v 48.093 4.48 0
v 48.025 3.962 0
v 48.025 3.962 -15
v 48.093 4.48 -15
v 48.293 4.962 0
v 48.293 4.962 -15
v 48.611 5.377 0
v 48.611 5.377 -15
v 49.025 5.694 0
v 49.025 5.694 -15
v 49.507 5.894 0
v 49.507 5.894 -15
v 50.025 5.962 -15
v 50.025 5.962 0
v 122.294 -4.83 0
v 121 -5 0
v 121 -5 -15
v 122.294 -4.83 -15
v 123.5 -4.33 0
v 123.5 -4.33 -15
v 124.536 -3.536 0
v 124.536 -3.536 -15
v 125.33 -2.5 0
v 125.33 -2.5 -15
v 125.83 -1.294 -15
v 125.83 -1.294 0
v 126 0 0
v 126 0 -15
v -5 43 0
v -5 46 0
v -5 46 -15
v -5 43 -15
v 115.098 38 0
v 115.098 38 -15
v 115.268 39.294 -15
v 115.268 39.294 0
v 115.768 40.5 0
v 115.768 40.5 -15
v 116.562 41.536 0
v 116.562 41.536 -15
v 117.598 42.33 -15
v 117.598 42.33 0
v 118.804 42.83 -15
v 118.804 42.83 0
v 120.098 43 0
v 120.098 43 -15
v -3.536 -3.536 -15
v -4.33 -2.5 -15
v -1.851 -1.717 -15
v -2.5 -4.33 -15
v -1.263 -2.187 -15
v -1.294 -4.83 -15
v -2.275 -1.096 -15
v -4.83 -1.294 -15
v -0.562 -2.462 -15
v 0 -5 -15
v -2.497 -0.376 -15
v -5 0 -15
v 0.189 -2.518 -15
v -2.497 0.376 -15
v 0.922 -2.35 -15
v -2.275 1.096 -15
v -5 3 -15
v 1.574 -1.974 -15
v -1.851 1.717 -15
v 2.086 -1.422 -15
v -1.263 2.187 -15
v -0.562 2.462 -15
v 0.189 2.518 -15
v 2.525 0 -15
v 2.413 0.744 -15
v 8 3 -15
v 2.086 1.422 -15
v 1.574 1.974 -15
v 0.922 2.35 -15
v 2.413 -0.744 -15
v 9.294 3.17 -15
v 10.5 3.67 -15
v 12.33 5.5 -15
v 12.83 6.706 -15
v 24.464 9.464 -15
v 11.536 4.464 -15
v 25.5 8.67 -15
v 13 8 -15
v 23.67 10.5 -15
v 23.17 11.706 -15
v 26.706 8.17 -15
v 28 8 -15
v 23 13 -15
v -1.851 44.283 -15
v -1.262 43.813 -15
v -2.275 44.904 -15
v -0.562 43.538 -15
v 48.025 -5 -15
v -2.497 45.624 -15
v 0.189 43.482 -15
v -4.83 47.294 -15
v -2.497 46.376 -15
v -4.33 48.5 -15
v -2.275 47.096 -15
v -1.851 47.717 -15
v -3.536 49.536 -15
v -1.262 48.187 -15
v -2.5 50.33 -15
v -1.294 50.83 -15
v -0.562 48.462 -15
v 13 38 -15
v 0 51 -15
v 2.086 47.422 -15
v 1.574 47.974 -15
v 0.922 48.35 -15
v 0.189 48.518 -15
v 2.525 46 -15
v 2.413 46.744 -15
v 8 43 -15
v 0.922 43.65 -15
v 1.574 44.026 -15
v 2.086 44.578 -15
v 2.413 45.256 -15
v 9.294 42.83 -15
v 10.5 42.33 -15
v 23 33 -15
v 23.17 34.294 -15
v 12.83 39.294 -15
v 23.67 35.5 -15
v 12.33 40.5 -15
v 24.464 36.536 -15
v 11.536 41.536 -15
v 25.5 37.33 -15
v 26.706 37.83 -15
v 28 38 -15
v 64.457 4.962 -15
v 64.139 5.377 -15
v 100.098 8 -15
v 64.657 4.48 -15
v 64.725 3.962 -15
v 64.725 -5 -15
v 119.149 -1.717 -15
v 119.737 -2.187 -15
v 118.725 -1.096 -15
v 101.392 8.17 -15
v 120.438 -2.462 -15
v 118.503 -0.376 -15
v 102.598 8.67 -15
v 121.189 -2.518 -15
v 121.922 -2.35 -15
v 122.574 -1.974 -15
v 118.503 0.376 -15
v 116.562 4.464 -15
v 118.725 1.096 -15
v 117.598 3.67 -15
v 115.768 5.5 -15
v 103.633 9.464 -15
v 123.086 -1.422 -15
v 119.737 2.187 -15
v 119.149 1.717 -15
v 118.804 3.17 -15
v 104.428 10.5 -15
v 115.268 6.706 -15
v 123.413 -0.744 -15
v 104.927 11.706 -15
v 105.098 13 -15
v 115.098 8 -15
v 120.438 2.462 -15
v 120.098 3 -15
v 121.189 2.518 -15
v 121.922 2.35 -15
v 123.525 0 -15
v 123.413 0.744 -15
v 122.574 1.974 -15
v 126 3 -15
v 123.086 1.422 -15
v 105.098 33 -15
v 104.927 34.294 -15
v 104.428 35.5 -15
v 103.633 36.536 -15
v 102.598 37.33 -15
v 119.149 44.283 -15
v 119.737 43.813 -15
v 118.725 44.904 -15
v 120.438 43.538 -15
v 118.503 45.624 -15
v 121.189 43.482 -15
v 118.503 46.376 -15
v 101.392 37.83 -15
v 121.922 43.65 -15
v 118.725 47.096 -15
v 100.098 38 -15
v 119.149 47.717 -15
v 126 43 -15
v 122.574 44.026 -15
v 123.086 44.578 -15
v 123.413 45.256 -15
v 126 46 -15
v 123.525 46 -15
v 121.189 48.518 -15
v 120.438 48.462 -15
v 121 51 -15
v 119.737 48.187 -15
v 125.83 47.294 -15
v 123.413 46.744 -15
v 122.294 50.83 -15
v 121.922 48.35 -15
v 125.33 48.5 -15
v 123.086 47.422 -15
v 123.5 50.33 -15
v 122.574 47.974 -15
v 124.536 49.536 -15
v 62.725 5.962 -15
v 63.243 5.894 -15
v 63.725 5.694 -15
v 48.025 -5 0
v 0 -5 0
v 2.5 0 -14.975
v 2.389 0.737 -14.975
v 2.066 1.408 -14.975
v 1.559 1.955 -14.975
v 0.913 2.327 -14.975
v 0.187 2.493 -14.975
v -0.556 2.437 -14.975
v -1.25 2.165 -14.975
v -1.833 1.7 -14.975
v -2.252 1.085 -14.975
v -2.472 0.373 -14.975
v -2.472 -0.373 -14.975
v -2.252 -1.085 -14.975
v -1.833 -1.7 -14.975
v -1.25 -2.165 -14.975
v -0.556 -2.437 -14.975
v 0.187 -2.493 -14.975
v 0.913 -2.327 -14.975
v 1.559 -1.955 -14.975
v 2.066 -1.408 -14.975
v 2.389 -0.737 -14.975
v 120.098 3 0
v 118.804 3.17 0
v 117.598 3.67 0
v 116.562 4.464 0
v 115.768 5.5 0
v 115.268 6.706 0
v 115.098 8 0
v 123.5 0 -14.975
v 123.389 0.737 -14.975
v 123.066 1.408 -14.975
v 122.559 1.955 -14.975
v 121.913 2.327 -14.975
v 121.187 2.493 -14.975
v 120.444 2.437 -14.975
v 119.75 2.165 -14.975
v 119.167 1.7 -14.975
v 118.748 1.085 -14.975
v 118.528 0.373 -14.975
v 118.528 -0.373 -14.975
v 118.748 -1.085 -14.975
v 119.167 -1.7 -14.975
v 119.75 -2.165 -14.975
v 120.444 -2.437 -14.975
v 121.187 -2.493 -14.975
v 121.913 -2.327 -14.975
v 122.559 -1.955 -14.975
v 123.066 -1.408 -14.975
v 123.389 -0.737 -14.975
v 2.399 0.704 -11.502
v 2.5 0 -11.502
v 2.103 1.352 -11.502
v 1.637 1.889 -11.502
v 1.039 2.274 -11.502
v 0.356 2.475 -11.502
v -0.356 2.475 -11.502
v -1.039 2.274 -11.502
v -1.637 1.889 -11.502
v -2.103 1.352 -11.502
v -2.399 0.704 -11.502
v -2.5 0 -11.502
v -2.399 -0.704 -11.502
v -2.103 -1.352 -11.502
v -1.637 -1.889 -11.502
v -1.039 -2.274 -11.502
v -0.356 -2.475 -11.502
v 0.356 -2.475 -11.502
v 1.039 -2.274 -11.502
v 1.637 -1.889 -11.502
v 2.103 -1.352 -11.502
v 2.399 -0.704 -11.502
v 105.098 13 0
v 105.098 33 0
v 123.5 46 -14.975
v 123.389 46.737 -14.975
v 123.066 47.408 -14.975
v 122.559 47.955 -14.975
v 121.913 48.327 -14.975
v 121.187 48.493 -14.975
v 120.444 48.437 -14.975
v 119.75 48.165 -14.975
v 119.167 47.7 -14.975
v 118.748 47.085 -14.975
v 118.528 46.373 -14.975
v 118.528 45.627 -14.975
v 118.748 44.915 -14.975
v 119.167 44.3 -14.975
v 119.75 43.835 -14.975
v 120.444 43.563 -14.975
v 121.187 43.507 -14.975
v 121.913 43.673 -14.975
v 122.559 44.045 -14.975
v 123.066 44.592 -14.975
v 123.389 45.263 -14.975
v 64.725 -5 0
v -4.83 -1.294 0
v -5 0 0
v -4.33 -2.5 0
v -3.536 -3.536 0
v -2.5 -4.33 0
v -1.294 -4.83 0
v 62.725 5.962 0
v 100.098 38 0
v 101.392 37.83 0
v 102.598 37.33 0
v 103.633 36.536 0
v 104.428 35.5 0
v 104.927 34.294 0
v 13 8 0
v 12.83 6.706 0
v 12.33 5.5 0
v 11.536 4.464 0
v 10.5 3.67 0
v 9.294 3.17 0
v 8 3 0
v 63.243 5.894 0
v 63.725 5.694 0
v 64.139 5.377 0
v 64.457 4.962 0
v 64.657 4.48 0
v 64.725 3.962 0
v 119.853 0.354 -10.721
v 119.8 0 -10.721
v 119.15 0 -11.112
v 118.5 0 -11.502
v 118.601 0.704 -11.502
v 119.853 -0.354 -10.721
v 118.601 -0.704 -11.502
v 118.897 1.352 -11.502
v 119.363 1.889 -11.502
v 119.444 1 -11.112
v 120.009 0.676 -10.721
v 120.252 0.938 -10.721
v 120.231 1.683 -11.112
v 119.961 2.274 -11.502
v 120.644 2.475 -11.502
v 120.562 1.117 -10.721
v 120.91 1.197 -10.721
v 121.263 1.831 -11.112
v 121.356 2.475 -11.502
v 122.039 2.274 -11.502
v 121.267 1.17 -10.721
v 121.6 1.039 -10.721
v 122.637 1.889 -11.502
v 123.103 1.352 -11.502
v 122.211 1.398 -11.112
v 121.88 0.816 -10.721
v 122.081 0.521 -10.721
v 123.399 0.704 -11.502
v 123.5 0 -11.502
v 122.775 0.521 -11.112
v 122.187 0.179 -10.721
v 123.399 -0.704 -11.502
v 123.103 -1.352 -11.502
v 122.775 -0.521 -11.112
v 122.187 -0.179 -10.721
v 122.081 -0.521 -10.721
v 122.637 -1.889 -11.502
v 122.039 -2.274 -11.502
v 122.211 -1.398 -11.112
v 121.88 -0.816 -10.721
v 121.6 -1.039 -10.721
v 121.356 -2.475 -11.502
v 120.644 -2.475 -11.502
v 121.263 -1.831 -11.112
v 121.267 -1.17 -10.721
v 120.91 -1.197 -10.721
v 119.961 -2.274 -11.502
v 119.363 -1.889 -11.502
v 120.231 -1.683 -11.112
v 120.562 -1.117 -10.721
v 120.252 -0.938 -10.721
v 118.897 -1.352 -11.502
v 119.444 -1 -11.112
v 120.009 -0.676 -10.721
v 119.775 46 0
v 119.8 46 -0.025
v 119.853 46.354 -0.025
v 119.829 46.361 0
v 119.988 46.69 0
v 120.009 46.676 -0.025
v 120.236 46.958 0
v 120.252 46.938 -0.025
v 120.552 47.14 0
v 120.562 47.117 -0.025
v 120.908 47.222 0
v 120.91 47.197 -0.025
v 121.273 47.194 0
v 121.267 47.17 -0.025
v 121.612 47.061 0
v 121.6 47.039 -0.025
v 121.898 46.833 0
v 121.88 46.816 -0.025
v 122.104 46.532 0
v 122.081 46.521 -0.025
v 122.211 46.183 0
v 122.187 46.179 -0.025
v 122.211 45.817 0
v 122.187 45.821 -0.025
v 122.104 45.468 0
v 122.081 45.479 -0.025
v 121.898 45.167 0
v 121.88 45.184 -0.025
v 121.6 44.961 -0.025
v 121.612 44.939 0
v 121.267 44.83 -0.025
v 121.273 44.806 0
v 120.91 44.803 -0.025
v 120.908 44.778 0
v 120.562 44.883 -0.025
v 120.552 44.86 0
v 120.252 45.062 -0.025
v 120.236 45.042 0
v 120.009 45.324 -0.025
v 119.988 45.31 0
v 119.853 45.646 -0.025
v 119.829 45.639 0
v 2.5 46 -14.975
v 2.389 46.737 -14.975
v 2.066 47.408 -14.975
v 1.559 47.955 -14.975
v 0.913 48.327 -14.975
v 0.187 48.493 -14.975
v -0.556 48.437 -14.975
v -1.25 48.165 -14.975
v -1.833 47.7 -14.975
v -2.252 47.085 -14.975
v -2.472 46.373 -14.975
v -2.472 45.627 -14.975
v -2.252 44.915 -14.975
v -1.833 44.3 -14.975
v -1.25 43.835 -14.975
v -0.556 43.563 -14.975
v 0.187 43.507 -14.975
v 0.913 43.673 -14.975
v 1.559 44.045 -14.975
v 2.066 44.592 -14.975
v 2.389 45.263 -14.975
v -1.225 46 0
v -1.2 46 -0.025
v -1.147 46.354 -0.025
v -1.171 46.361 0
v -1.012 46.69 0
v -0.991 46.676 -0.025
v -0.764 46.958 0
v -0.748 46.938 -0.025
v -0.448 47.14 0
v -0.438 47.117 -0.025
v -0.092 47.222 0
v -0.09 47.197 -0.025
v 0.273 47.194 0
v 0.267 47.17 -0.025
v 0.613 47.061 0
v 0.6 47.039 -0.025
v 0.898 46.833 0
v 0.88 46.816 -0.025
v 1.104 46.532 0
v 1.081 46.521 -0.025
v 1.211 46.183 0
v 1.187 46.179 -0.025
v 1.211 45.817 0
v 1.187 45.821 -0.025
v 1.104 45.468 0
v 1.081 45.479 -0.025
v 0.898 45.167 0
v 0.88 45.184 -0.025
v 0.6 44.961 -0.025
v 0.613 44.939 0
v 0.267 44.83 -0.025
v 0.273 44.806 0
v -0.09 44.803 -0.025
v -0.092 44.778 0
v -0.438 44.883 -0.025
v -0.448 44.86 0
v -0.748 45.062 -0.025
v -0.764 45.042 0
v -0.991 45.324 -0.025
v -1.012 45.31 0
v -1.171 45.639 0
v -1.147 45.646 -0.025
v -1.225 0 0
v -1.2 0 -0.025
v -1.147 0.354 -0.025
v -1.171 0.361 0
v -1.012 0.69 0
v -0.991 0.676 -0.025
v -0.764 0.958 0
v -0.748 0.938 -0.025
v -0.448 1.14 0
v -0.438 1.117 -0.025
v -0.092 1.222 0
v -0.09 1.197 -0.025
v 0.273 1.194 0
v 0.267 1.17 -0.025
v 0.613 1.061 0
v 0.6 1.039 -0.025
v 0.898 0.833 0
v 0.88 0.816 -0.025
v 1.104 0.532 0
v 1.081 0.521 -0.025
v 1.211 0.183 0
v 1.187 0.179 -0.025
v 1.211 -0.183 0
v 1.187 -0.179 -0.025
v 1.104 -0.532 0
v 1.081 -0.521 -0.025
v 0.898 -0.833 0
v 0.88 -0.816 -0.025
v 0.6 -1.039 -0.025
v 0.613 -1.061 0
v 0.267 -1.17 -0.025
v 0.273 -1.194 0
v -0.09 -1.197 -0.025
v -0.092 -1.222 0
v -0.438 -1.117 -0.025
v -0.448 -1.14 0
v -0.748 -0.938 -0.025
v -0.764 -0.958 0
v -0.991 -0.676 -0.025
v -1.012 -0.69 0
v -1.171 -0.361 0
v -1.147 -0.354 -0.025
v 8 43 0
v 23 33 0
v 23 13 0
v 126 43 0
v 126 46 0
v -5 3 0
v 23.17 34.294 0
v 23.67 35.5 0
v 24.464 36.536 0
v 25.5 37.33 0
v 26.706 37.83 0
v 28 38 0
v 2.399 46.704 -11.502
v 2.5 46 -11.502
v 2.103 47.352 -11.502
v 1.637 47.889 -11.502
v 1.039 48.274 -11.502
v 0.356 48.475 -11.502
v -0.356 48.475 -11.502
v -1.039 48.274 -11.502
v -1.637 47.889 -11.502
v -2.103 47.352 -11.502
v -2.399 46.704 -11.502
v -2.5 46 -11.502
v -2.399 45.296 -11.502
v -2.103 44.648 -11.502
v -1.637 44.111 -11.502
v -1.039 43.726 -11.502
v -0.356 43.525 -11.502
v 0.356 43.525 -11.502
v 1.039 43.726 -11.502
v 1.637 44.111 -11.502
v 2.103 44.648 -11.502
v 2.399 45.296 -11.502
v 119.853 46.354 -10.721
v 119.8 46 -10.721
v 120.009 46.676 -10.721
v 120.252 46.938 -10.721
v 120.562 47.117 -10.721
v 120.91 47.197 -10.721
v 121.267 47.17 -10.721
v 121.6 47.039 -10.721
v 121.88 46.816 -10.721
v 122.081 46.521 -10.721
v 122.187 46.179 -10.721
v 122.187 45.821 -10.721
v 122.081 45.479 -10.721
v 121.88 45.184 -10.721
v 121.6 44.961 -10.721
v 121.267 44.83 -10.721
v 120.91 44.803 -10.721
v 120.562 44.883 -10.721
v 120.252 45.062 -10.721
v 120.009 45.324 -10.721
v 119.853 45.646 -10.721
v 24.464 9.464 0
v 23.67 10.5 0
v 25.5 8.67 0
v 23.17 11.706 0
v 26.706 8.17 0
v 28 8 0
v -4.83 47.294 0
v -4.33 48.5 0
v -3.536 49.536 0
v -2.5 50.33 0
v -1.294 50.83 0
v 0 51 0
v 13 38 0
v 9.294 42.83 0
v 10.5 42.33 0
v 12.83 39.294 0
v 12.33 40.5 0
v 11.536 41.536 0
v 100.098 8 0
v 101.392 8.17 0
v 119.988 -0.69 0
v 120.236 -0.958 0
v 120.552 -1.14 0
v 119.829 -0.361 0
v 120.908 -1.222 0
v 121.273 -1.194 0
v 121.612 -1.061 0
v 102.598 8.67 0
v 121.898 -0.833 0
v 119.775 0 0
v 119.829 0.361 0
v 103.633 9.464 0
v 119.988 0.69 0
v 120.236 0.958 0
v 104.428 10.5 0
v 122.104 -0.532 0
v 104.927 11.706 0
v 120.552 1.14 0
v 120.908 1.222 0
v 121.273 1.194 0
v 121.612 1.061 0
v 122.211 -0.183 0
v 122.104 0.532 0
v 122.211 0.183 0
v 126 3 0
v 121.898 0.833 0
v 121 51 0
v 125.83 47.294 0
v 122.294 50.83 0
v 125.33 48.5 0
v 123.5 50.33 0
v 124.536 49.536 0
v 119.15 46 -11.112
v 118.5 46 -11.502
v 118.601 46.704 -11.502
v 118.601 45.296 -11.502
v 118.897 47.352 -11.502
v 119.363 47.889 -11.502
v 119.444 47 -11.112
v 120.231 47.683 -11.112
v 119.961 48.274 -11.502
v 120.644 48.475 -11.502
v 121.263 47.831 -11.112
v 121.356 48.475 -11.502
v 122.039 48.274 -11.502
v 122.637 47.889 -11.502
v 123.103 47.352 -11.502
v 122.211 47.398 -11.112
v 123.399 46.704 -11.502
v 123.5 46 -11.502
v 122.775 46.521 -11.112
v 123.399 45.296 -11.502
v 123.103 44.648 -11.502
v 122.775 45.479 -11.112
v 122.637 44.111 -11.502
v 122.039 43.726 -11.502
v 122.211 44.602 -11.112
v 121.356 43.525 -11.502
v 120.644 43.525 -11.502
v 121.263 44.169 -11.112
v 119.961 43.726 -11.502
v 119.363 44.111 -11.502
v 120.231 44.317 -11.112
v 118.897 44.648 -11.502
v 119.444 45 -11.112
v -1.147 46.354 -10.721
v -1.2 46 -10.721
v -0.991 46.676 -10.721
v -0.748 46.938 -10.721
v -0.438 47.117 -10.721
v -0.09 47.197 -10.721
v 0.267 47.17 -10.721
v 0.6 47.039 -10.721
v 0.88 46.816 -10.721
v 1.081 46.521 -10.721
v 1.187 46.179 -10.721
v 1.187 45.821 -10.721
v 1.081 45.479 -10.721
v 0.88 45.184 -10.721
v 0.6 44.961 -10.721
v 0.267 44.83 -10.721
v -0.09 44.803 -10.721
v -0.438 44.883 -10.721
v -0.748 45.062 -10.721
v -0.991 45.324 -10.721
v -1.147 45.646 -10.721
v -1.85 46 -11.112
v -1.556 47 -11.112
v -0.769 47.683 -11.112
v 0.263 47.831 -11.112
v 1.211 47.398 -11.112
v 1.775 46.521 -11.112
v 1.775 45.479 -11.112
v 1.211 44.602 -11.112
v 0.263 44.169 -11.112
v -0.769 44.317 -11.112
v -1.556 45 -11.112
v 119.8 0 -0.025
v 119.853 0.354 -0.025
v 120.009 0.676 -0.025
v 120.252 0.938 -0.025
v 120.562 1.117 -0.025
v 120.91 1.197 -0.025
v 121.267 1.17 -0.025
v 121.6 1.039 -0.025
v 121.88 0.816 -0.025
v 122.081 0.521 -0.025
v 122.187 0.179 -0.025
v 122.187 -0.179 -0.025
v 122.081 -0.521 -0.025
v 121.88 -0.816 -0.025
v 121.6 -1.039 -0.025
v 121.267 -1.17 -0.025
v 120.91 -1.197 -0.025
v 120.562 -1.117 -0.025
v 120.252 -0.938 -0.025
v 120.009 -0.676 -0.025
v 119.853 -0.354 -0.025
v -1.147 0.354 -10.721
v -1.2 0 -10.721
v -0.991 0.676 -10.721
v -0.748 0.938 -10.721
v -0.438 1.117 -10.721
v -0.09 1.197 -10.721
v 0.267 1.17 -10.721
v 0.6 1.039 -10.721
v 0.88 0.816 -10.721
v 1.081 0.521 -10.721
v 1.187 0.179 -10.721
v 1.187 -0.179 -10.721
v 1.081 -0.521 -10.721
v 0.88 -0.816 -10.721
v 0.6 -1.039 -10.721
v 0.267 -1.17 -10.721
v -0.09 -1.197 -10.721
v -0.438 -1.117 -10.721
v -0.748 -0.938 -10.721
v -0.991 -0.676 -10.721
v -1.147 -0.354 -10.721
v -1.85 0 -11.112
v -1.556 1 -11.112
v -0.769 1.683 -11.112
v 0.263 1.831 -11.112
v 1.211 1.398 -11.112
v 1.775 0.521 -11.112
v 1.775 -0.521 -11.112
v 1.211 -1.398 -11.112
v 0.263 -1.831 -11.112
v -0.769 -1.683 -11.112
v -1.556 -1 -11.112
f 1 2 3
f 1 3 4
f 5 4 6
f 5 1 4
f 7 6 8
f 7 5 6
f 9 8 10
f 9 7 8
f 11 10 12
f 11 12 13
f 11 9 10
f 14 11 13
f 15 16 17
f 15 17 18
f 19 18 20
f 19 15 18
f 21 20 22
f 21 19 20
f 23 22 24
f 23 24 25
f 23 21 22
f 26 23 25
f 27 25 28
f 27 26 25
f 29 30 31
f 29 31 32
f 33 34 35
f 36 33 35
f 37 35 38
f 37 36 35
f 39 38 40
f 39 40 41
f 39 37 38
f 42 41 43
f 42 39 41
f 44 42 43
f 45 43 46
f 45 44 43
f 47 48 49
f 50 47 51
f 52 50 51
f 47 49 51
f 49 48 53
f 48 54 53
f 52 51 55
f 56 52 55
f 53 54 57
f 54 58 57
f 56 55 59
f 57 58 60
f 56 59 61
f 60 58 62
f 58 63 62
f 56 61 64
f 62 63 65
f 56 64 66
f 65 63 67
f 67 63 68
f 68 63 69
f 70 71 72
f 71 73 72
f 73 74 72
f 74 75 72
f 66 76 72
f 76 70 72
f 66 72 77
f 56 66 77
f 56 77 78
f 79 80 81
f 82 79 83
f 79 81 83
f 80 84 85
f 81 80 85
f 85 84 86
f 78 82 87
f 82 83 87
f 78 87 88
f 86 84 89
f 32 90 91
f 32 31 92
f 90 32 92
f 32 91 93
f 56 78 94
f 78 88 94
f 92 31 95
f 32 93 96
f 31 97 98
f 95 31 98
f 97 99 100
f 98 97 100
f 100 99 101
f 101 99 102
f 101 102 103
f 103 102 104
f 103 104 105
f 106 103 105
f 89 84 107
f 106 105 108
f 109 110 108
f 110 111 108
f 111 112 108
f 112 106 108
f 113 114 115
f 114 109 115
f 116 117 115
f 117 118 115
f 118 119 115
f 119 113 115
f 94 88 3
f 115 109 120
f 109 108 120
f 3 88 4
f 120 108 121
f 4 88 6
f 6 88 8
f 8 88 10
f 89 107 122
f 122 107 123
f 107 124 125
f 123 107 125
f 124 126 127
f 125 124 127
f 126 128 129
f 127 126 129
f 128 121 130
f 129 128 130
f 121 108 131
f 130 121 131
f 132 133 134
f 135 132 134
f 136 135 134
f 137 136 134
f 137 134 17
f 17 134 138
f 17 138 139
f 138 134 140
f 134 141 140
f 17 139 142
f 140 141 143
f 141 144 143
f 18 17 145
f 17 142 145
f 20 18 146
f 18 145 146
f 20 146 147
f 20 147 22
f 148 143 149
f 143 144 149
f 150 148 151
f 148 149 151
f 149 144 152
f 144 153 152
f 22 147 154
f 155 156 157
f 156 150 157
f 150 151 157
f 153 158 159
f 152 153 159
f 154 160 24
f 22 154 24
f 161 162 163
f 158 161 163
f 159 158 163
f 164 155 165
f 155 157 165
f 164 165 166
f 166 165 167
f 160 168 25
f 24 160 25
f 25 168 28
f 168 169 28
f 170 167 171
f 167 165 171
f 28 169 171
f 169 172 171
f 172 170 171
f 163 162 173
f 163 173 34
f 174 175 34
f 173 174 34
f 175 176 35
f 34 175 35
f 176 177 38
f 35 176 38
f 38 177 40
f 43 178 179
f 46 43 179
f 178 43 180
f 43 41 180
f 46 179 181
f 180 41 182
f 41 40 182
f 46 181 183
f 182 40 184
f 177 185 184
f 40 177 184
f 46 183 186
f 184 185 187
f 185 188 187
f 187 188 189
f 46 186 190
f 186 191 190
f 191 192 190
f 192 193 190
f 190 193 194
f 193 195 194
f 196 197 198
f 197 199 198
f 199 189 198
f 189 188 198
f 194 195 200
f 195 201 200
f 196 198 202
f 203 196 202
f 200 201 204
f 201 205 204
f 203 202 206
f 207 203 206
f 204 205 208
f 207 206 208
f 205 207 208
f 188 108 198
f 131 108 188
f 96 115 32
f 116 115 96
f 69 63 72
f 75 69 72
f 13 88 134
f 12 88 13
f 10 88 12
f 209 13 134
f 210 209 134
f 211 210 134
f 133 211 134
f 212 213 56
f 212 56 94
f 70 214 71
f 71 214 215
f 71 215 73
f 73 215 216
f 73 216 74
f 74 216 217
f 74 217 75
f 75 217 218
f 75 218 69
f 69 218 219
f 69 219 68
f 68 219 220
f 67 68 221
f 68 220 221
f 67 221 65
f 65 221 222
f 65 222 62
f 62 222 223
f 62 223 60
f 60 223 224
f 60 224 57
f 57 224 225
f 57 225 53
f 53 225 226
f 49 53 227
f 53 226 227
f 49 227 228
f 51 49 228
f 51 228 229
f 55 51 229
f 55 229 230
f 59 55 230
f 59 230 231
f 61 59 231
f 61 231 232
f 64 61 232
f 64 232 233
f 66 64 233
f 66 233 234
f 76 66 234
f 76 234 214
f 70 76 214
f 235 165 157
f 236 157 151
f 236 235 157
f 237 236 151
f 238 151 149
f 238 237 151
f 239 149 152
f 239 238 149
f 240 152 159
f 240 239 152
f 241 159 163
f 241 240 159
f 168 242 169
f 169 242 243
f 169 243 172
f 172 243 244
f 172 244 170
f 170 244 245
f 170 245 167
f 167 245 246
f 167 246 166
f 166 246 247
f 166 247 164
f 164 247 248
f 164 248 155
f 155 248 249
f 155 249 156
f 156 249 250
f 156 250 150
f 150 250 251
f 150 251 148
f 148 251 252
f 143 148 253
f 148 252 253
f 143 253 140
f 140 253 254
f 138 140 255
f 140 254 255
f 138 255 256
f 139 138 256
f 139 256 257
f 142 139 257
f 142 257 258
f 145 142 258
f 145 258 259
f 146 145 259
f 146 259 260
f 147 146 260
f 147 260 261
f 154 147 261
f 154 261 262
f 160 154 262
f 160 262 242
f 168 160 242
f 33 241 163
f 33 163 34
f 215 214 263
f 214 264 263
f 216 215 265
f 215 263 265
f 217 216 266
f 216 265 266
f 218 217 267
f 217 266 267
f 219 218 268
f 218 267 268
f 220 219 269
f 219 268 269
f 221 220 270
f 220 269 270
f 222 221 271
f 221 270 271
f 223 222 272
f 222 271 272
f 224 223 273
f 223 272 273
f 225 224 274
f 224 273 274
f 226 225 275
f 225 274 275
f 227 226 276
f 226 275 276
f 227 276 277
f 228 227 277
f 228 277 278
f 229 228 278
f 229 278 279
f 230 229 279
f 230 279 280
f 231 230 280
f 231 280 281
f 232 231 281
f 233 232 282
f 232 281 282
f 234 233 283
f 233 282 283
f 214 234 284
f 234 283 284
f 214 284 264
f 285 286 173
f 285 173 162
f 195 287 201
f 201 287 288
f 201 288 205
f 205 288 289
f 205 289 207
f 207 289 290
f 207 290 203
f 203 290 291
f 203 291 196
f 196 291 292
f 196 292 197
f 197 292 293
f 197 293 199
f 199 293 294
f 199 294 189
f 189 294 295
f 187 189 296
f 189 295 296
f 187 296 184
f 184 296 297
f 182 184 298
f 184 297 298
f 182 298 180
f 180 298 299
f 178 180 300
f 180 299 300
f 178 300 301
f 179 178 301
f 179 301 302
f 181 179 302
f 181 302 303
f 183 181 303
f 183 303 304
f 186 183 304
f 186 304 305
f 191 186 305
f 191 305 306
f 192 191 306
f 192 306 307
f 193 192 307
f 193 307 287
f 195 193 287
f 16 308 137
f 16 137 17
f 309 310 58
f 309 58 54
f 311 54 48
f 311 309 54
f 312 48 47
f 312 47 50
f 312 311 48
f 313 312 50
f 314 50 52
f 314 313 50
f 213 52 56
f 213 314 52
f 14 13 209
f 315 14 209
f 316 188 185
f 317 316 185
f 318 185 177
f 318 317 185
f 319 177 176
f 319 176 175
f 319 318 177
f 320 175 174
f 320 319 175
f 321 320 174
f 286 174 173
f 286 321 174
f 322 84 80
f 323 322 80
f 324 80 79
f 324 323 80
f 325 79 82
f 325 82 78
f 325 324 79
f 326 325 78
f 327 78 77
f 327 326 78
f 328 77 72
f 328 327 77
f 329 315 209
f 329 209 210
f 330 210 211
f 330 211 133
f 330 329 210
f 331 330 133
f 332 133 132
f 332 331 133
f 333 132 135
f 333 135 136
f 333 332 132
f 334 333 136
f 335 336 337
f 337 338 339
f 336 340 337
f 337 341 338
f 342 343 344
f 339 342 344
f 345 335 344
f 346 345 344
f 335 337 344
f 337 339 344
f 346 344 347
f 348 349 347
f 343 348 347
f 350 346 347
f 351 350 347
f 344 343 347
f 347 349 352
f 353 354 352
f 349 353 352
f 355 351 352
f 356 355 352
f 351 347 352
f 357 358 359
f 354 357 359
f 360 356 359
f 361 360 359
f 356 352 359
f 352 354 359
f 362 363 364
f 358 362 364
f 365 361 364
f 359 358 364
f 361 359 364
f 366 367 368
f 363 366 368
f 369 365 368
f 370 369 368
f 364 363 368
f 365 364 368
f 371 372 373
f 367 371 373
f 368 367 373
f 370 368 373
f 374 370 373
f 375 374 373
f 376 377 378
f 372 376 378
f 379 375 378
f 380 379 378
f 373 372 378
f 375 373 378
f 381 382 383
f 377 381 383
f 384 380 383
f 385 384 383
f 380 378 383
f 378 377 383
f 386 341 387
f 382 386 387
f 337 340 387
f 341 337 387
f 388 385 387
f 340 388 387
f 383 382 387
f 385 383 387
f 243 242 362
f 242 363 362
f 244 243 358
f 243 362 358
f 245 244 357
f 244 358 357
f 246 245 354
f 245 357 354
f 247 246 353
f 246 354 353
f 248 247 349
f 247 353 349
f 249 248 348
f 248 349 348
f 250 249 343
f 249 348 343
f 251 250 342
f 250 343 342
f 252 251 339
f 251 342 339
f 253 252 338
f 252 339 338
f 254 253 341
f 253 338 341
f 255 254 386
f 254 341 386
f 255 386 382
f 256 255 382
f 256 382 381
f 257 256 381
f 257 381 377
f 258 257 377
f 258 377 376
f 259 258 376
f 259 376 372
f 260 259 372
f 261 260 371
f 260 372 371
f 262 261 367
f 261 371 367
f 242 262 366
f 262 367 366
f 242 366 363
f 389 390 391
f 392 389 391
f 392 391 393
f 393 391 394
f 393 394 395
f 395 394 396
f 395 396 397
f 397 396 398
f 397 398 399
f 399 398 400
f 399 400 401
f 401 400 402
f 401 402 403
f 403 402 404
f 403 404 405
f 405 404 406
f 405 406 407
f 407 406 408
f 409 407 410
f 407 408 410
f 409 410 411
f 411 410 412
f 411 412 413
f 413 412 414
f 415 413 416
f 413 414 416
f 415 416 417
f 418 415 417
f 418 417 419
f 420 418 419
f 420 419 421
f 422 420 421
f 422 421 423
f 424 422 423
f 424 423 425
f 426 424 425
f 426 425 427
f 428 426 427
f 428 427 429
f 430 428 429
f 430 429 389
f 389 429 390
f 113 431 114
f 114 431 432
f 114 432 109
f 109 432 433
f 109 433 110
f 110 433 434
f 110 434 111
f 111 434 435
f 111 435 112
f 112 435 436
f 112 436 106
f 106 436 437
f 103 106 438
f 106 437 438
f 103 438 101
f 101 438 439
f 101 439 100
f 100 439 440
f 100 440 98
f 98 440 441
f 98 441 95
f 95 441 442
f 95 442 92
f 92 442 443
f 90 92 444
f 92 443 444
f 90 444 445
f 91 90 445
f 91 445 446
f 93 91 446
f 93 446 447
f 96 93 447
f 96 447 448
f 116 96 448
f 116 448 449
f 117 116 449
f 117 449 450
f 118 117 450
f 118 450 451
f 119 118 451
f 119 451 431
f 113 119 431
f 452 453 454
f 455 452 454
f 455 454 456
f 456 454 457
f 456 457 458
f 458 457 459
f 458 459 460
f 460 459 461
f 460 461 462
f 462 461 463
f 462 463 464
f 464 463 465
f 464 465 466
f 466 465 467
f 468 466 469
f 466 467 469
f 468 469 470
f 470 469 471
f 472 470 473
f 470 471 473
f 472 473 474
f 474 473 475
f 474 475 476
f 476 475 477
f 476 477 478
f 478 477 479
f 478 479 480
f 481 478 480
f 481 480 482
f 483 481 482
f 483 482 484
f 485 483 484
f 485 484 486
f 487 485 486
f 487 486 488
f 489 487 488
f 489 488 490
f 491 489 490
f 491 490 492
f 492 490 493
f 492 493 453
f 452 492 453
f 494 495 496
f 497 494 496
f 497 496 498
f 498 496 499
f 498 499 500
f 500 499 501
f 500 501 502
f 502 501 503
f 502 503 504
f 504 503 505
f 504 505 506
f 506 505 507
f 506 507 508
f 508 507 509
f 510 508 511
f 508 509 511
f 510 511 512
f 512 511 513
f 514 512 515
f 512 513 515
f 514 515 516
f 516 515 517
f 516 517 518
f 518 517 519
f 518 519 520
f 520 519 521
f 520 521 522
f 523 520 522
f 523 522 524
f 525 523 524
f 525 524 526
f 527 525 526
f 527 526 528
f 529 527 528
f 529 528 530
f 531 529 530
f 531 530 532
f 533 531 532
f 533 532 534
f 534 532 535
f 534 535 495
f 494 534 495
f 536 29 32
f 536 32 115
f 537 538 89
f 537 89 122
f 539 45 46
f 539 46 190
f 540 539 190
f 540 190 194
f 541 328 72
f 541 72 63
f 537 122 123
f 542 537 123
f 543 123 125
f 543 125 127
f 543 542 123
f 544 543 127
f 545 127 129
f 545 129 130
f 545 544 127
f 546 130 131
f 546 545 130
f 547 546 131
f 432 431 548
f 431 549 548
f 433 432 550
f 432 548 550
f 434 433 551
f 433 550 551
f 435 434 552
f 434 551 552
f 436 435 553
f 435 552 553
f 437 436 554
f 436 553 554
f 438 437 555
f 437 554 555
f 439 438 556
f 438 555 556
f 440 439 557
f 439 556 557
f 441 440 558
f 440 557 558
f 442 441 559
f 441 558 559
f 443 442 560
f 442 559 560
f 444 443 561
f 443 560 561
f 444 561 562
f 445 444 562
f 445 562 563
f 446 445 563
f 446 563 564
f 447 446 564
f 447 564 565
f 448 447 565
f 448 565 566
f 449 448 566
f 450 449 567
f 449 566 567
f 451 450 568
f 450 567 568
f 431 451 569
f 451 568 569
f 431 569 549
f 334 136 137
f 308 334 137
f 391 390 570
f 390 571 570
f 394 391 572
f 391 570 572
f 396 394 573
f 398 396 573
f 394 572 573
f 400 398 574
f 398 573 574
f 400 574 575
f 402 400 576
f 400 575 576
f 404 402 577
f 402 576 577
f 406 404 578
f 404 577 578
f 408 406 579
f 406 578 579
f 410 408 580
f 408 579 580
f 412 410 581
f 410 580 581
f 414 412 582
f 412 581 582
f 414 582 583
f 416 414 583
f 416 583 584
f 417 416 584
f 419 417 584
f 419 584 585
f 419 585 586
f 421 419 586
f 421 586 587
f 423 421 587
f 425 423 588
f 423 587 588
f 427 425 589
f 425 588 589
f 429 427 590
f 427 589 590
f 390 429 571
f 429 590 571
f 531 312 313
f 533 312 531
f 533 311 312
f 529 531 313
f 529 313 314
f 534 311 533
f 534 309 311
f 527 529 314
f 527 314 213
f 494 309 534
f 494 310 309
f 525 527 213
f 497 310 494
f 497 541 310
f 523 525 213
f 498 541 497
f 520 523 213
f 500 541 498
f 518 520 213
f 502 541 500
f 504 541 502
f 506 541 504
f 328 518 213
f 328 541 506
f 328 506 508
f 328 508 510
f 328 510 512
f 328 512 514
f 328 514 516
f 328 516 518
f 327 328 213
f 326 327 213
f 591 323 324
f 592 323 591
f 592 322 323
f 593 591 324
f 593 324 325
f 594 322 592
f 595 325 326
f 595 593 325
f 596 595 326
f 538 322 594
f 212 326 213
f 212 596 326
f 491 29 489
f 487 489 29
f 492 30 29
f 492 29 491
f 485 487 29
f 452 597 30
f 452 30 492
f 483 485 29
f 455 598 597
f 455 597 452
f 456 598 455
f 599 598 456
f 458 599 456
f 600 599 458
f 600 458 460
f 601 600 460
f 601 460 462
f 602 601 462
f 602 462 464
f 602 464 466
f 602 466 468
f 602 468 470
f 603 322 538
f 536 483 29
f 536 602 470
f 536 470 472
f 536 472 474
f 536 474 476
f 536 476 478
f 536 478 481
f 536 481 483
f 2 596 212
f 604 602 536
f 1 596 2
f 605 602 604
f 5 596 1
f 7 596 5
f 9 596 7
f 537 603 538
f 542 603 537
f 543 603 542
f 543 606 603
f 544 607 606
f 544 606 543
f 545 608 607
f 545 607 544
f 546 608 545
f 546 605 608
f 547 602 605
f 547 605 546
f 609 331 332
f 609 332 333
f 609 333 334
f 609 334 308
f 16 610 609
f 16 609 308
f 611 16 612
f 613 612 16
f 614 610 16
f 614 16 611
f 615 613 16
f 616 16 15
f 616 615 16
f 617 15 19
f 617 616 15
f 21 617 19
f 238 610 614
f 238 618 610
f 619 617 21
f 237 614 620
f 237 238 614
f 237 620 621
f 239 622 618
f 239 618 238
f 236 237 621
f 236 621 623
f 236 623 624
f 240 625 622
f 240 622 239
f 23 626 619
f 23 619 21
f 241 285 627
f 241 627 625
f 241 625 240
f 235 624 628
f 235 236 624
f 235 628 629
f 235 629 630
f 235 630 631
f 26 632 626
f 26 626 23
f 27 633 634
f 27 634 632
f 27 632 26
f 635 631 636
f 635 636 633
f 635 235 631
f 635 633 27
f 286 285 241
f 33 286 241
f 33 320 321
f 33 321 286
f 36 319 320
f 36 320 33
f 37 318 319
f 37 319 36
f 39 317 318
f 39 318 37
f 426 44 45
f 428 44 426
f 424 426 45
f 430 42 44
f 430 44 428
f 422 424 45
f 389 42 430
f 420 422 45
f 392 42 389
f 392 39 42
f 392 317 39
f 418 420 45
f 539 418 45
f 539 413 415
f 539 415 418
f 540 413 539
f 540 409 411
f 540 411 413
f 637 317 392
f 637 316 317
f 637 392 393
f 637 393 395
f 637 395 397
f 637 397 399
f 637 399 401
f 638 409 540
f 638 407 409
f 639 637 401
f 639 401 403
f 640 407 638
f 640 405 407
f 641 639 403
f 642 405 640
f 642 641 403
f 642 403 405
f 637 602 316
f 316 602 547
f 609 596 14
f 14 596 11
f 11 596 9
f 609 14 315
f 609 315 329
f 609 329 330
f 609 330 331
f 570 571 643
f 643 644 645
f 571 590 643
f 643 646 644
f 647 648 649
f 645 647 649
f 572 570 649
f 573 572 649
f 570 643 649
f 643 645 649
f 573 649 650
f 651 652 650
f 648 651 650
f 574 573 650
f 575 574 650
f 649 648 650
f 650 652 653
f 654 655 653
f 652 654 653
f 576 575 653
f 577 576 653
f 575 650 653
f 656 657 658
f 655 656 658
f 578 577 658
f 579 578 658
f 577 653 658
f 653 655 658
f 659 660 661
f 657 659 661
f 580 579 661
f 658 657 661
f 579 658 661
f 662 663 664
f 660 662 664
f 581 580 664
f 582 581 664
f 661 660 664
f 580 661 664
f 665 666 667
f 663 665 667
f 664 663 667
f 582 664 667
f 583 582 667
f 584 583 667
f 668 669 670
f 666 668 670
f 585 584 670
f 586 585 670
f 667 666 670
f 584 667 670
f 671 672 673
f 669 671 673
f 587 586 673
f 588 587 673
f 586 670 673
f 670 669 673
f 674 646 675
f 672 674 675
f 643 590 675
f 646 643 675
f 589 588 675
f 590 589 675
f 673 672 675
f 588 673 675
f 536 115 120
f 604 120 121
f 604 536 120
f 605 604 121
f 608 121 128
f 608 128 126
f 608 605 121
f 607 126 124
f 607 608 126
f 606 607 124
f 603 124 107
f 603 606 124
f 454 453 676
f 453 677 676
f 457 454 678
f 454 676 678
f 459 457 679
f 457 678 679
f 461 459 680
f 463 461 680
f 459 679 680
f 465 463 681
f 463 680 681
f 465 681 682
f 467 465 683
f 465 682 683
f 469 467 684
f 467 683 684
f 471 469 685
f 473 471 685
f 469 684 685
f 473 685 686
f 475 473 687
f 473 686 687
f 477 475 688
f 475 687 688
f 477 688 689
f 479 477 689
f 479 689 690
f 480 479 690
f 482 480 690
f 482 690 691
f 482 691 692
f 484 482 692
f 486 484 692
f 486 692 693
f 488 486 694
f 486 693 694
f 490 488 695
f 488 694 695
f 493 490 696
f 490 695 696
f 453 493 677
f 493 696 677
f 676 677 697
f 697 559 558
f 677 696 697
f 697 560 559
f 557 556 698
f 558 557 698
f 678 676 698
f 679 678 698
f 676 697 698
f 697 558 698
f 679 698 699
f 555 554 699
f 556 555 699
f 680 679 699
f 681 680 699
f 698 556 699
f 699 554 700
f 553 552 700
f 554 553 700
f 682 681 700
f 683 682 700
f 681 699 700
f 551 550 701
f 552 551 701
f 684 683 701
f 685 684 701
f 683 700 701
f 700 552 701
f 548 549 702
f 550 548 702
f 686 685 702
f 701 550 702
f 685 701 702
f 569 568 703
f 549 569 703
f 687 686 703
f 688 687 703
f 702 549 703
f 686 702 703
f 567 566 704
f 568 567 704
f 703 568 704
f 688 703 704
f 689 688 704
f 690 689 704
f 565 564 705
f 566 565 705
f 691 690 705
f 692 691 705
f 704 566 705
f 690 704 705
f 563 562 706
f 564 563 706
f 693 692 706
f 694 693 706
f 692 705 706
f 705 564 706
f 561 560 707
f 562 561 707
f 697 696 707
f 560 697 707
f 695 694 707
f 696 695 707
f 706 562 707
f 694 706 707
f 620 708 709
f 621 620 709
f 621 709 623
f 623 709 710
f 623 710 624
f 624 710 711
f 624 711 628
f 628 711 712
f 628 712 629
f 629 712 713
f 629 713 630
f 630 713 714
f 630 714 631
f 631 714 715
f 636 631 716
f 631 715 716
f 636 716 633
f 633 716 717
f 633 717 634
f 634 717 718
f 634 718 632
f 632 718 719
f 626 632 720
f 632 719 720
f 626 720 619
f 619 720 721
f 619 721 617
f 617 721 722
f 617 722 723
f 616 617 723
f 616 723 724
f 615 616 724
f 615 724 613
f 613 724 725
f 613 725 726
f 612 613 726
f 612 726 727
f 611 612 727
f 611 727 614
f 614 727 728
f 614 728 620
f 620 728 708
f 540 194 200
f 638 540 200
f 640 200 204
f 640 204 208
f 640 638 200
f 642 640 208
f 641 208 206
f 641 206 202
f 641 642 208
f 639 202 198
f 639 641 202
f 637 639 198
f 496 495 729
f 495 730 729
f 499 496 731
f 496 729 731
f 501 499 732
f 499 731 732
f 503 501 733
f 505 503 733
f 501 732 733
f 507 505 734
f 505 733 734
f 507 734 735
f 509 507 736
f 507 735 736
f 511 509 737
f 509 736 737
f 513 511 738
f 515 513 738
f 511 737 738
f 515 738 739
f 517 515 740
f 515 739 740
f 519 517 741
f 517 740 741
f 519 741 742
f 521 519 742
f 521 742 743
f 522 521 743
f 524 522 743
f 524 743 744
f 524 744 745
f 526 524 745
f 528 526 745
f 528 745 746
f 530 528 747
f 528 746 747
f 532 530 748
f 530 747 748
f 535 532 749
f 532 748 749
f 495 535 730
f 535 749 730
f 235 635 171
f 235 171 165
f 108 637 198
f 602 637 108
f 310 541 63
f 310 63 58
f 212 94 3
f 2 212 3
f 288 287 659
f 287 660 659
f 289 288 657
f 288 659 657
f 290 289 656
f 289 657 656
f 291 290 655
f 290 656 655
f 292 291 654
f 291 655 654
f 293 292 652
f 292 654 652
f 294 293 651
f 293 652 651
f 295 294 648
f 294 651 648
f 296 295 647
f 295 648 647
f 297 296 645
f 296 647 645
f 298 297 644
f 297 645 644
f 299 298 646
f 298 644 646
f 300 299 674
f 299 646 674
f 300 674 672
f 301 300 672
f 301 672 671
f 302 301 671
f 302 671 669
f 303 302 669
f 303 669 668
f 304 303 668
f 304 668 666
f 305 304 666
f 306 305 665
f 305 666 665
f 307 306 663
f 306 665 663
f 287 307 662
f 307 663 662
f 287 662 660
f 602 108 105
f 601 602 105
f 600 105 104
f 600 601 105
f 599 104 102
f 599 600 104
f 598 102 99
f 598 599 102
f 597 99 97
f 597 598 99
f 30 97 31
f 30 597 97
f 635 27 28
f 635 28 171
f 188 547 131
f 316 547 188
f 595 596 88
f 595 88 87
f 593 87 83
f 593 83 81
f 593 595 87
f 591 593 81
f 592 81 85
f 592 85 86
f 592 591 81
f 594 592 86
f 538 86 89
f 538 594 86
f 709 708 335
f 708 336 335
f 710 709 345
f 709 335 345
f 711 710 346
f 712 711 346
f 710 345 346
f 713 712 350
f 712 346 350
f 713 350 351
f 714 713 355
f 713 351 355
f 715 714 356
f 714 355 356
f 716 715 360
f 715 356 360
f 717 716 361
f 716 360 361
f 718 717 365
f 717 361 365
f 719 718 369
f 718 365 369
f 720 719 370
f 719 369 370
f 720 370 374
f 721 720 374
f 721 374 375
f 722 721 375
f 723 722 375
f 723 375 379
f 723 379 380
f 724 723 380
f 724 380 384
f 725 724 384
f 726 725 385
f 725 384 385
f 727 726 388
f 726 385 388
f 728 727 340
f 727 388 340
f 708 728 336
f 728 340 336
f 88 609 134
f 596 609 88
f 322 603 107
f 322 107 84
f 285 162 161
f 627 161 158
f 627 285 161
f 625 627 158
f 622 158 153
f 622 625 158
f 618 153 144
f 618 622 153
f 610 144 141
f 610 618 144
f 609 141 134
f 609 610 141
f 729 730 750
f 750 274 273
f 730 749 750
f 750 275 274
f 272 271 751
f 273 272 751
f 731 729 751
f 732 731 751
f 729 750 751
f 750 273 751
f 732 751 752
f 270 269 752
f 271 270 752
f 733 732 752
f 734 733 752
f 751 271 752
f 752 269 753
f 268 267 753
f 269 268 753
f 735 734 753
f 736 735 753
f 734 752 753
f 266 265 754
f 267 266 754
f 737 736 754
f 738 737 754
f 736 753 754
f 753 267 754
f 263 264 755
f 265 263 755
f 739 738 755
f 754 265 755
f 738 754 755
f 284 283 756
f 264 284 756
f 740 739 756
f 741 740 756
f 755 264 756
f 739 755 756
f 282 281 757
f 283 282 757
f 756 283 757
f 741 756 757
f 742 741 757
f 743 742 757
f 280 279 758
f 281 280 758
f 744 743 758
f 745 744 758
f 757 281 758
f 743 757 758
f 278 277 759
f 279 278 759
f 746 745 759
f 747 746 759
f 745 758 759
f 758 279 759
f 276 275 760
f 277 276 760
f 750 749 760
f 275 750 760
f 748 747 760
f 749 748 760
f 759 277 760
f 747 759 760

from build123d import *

# Parameters (mm, degrees)
EXTRUDE_1_DEPTH               = 15
HOLE_WIZARD_M21_D             = 2.4
HOLE_WIZARD_M21_CSINK_D       = 2.45
HOLE_WIZARD_M21_CSINK_ANGLE   = 90
HOLE_WIZARD_5_0_1_D           = 5
HOLE_WIZARD_5_0_1_DEPTH       = 3.497848452
HOLE_WIZARD_5_0_1_CSINK_D     = 5.05
HOLE_WIZARD_5_0_1_CSINK_ANGLE = 90
HOLE_WIZARD_5_0_1_TIP         = 1.502151548


with BuildPart() as part:
    # Эскиз9 → Бобышка-Вытянуть1 (new body)
    with BuildSketch(Plane.XY):
        with BuildLine():
            Line((-1.706e-06, -5.00000143), (48.02500155, -5.00000143))
            Line((48.02500155, -5.00000143), (48.02500155, 3.9624))
            ThreePointArc((48.02500155, 3.9624), (48.610787988, 5.376613562), (50.02500155, 5.9624))
            Line((50.02500155, 5.9624), (62.72500155, 5.9624))
            ThreePointArc((62.72500155, 5.9624), (64.139215112, 5.376613562), (64.72500155, 3.9624))
            Line((64.72500155, 3.9624), (64.72500155, -5.00000143))
            Line((64.72500155, -5.00000143), (120.99999946, -5.00000143))
            ThreePointArc((120.99999946, -5.00000143), (124.535533366, -3.535535336), (125.99999946, -1.43e-06))
            Line((125.99999946, -1.43e-06), (125.99999946, 2.99999857))
            Line((125.99999946, 2.99999857), (120.09775193, 2.99999857))
            ThreePointArc((120.09775193, 2.99999857), (116.562218024, 4.464464664), (115.09775193, 7.99999857))
            Line((115.09775193, 7.99999857), (115.09775193, 37.99999857))
            ThreePointArc((115.09775193, 37.99999857), (116.562218024, 41.535532476), (120.09775193, 42.99999857))
            Line((120.09775193, 42.99999857), (125.99999946, 42.99999857))
            Line((125.99999946, 42.99999857), (125.99999946, 45.99999857))
            ThreePointArc((125.99999946, 45.99999857), (124.535533366, 49.535532476), (120.99999946, 50.99999857))
            Line((120.99999946, 50.99999857), (-1.706e-06, 50.99999857))
            ThreePointArc((-1.706e-06, 50.99999857), (-3.535534858, 49.535532064), (-5.00000054, 45.99999857))
            Line((-5.00000054, 45.99999857), (-5.00000054, 42.99999857))
            Line((-5.00000054, 42.99999857), (7.999998294, 42.99999857))
            ThreePointArc((7.999998294, 42.99999857), (11.5355322, 41.535532476), (12.999998294, 37.99999857))
            Line((12.999998294, 37.99999857), (12.999998294, 7.99999857))
            ThreePointArc((12.999998294, 7.99999857), (11.5355322, 4.464464664), (7.999998294, 2.99999857))
            Line((7.999998294, 2.99999857), (-5.000001706, 2.99999857))
            Line((-5.000001706, 2.99999857), (-5.000001706, -1.43e-06))
            ThreePointArc((-5.000001706, -1.43e-06), (-3.535535612, -3.535535336), (-1.706e-06, -5.00000143))
        make_face()
        with BuildLine():
            Line((27.999998294, 37.99999857), (100.09775193, 37.99999857))
            ThreePointArc((100.09775193, 37.99999857), (103.633285836, 36.535532476), (105.09775193, 32.99999857))
            Line((105.09775193, 32.99999857), (105.09775193, 12.99999857))
            ThreePointArc((105.09775193, 12.99999857), (103.633285836, 9.464464664), (100.09775193, 7.99999857))
            Line((100.09775193, 7.99999857), (27.999998294, 7.99999857))
            ThreePointArc((27.999998294, 7.99999857), (24.464464388, 9.464464664), (22.999998294, 12.99999857))
            Line((22.999998294, 12.99999857), (22.999998294, 32.99999857))
            ThreePointArc((22.999998294, 32.99999857), (24.464464388, 36.535532476), (27.999998294, 37.99999857))
        make_face(mode=Mode.SUBTRACT)
    extrude(amount=-EXTRUDE_1_DEPTH)

    # Отверстие с зазором M21 (through all)
    with Locations(Plane.XY):
        with Locations((1.27e-06, 45.99999944), (0, 0), (120.9999993, -1.27e-06), (120.9999993, 45.99999944)):
            CounterSinkHole(HOLE_WIZARD_M21_D / 2, HOLE_WIZARD_M21_CSINK_D / 2, counter_sink_angle=HOLE_WIZARD_M21_CSINK_ANGLE)

    # Отверстия под штифты Ø5.0 мм1
    with Locations(Plane(origin=(0, 0, -15), x_dir=(-1, 0, 0), z_dir=(0, 0, -1))):
        with Locations((-120.9999993, -1.27e-06), (-120.9999993, 45.99999944), (-1.27e-06, 45.99999944), (0, 0), (-55.116594528, 0)):
            CounterSinkHole(HOLE_WIZARD_5_0_1_D / 2, HOLE_WIZARD_5_0_1_CSINK_D / 2, depth=HOLE_WIZARD_5_0_1_DEPTH, counter_sink_angle=HOLE_WIZARD_5_0_1_CSINK_ANGLE)
            with Locations((0, 0, -(HOLE_WIZARD_5_0_1_DEPTH + HOLE_WIZARD_5_0_1_TIP / 2))):  # 118° drill point
                Cone(0, HOLE_WIZARD_5_0_1_D / 2, HOLE_WIZARD_5_0_1_TIP, mode=Mode.SUBTRACT)


solid = part.part
